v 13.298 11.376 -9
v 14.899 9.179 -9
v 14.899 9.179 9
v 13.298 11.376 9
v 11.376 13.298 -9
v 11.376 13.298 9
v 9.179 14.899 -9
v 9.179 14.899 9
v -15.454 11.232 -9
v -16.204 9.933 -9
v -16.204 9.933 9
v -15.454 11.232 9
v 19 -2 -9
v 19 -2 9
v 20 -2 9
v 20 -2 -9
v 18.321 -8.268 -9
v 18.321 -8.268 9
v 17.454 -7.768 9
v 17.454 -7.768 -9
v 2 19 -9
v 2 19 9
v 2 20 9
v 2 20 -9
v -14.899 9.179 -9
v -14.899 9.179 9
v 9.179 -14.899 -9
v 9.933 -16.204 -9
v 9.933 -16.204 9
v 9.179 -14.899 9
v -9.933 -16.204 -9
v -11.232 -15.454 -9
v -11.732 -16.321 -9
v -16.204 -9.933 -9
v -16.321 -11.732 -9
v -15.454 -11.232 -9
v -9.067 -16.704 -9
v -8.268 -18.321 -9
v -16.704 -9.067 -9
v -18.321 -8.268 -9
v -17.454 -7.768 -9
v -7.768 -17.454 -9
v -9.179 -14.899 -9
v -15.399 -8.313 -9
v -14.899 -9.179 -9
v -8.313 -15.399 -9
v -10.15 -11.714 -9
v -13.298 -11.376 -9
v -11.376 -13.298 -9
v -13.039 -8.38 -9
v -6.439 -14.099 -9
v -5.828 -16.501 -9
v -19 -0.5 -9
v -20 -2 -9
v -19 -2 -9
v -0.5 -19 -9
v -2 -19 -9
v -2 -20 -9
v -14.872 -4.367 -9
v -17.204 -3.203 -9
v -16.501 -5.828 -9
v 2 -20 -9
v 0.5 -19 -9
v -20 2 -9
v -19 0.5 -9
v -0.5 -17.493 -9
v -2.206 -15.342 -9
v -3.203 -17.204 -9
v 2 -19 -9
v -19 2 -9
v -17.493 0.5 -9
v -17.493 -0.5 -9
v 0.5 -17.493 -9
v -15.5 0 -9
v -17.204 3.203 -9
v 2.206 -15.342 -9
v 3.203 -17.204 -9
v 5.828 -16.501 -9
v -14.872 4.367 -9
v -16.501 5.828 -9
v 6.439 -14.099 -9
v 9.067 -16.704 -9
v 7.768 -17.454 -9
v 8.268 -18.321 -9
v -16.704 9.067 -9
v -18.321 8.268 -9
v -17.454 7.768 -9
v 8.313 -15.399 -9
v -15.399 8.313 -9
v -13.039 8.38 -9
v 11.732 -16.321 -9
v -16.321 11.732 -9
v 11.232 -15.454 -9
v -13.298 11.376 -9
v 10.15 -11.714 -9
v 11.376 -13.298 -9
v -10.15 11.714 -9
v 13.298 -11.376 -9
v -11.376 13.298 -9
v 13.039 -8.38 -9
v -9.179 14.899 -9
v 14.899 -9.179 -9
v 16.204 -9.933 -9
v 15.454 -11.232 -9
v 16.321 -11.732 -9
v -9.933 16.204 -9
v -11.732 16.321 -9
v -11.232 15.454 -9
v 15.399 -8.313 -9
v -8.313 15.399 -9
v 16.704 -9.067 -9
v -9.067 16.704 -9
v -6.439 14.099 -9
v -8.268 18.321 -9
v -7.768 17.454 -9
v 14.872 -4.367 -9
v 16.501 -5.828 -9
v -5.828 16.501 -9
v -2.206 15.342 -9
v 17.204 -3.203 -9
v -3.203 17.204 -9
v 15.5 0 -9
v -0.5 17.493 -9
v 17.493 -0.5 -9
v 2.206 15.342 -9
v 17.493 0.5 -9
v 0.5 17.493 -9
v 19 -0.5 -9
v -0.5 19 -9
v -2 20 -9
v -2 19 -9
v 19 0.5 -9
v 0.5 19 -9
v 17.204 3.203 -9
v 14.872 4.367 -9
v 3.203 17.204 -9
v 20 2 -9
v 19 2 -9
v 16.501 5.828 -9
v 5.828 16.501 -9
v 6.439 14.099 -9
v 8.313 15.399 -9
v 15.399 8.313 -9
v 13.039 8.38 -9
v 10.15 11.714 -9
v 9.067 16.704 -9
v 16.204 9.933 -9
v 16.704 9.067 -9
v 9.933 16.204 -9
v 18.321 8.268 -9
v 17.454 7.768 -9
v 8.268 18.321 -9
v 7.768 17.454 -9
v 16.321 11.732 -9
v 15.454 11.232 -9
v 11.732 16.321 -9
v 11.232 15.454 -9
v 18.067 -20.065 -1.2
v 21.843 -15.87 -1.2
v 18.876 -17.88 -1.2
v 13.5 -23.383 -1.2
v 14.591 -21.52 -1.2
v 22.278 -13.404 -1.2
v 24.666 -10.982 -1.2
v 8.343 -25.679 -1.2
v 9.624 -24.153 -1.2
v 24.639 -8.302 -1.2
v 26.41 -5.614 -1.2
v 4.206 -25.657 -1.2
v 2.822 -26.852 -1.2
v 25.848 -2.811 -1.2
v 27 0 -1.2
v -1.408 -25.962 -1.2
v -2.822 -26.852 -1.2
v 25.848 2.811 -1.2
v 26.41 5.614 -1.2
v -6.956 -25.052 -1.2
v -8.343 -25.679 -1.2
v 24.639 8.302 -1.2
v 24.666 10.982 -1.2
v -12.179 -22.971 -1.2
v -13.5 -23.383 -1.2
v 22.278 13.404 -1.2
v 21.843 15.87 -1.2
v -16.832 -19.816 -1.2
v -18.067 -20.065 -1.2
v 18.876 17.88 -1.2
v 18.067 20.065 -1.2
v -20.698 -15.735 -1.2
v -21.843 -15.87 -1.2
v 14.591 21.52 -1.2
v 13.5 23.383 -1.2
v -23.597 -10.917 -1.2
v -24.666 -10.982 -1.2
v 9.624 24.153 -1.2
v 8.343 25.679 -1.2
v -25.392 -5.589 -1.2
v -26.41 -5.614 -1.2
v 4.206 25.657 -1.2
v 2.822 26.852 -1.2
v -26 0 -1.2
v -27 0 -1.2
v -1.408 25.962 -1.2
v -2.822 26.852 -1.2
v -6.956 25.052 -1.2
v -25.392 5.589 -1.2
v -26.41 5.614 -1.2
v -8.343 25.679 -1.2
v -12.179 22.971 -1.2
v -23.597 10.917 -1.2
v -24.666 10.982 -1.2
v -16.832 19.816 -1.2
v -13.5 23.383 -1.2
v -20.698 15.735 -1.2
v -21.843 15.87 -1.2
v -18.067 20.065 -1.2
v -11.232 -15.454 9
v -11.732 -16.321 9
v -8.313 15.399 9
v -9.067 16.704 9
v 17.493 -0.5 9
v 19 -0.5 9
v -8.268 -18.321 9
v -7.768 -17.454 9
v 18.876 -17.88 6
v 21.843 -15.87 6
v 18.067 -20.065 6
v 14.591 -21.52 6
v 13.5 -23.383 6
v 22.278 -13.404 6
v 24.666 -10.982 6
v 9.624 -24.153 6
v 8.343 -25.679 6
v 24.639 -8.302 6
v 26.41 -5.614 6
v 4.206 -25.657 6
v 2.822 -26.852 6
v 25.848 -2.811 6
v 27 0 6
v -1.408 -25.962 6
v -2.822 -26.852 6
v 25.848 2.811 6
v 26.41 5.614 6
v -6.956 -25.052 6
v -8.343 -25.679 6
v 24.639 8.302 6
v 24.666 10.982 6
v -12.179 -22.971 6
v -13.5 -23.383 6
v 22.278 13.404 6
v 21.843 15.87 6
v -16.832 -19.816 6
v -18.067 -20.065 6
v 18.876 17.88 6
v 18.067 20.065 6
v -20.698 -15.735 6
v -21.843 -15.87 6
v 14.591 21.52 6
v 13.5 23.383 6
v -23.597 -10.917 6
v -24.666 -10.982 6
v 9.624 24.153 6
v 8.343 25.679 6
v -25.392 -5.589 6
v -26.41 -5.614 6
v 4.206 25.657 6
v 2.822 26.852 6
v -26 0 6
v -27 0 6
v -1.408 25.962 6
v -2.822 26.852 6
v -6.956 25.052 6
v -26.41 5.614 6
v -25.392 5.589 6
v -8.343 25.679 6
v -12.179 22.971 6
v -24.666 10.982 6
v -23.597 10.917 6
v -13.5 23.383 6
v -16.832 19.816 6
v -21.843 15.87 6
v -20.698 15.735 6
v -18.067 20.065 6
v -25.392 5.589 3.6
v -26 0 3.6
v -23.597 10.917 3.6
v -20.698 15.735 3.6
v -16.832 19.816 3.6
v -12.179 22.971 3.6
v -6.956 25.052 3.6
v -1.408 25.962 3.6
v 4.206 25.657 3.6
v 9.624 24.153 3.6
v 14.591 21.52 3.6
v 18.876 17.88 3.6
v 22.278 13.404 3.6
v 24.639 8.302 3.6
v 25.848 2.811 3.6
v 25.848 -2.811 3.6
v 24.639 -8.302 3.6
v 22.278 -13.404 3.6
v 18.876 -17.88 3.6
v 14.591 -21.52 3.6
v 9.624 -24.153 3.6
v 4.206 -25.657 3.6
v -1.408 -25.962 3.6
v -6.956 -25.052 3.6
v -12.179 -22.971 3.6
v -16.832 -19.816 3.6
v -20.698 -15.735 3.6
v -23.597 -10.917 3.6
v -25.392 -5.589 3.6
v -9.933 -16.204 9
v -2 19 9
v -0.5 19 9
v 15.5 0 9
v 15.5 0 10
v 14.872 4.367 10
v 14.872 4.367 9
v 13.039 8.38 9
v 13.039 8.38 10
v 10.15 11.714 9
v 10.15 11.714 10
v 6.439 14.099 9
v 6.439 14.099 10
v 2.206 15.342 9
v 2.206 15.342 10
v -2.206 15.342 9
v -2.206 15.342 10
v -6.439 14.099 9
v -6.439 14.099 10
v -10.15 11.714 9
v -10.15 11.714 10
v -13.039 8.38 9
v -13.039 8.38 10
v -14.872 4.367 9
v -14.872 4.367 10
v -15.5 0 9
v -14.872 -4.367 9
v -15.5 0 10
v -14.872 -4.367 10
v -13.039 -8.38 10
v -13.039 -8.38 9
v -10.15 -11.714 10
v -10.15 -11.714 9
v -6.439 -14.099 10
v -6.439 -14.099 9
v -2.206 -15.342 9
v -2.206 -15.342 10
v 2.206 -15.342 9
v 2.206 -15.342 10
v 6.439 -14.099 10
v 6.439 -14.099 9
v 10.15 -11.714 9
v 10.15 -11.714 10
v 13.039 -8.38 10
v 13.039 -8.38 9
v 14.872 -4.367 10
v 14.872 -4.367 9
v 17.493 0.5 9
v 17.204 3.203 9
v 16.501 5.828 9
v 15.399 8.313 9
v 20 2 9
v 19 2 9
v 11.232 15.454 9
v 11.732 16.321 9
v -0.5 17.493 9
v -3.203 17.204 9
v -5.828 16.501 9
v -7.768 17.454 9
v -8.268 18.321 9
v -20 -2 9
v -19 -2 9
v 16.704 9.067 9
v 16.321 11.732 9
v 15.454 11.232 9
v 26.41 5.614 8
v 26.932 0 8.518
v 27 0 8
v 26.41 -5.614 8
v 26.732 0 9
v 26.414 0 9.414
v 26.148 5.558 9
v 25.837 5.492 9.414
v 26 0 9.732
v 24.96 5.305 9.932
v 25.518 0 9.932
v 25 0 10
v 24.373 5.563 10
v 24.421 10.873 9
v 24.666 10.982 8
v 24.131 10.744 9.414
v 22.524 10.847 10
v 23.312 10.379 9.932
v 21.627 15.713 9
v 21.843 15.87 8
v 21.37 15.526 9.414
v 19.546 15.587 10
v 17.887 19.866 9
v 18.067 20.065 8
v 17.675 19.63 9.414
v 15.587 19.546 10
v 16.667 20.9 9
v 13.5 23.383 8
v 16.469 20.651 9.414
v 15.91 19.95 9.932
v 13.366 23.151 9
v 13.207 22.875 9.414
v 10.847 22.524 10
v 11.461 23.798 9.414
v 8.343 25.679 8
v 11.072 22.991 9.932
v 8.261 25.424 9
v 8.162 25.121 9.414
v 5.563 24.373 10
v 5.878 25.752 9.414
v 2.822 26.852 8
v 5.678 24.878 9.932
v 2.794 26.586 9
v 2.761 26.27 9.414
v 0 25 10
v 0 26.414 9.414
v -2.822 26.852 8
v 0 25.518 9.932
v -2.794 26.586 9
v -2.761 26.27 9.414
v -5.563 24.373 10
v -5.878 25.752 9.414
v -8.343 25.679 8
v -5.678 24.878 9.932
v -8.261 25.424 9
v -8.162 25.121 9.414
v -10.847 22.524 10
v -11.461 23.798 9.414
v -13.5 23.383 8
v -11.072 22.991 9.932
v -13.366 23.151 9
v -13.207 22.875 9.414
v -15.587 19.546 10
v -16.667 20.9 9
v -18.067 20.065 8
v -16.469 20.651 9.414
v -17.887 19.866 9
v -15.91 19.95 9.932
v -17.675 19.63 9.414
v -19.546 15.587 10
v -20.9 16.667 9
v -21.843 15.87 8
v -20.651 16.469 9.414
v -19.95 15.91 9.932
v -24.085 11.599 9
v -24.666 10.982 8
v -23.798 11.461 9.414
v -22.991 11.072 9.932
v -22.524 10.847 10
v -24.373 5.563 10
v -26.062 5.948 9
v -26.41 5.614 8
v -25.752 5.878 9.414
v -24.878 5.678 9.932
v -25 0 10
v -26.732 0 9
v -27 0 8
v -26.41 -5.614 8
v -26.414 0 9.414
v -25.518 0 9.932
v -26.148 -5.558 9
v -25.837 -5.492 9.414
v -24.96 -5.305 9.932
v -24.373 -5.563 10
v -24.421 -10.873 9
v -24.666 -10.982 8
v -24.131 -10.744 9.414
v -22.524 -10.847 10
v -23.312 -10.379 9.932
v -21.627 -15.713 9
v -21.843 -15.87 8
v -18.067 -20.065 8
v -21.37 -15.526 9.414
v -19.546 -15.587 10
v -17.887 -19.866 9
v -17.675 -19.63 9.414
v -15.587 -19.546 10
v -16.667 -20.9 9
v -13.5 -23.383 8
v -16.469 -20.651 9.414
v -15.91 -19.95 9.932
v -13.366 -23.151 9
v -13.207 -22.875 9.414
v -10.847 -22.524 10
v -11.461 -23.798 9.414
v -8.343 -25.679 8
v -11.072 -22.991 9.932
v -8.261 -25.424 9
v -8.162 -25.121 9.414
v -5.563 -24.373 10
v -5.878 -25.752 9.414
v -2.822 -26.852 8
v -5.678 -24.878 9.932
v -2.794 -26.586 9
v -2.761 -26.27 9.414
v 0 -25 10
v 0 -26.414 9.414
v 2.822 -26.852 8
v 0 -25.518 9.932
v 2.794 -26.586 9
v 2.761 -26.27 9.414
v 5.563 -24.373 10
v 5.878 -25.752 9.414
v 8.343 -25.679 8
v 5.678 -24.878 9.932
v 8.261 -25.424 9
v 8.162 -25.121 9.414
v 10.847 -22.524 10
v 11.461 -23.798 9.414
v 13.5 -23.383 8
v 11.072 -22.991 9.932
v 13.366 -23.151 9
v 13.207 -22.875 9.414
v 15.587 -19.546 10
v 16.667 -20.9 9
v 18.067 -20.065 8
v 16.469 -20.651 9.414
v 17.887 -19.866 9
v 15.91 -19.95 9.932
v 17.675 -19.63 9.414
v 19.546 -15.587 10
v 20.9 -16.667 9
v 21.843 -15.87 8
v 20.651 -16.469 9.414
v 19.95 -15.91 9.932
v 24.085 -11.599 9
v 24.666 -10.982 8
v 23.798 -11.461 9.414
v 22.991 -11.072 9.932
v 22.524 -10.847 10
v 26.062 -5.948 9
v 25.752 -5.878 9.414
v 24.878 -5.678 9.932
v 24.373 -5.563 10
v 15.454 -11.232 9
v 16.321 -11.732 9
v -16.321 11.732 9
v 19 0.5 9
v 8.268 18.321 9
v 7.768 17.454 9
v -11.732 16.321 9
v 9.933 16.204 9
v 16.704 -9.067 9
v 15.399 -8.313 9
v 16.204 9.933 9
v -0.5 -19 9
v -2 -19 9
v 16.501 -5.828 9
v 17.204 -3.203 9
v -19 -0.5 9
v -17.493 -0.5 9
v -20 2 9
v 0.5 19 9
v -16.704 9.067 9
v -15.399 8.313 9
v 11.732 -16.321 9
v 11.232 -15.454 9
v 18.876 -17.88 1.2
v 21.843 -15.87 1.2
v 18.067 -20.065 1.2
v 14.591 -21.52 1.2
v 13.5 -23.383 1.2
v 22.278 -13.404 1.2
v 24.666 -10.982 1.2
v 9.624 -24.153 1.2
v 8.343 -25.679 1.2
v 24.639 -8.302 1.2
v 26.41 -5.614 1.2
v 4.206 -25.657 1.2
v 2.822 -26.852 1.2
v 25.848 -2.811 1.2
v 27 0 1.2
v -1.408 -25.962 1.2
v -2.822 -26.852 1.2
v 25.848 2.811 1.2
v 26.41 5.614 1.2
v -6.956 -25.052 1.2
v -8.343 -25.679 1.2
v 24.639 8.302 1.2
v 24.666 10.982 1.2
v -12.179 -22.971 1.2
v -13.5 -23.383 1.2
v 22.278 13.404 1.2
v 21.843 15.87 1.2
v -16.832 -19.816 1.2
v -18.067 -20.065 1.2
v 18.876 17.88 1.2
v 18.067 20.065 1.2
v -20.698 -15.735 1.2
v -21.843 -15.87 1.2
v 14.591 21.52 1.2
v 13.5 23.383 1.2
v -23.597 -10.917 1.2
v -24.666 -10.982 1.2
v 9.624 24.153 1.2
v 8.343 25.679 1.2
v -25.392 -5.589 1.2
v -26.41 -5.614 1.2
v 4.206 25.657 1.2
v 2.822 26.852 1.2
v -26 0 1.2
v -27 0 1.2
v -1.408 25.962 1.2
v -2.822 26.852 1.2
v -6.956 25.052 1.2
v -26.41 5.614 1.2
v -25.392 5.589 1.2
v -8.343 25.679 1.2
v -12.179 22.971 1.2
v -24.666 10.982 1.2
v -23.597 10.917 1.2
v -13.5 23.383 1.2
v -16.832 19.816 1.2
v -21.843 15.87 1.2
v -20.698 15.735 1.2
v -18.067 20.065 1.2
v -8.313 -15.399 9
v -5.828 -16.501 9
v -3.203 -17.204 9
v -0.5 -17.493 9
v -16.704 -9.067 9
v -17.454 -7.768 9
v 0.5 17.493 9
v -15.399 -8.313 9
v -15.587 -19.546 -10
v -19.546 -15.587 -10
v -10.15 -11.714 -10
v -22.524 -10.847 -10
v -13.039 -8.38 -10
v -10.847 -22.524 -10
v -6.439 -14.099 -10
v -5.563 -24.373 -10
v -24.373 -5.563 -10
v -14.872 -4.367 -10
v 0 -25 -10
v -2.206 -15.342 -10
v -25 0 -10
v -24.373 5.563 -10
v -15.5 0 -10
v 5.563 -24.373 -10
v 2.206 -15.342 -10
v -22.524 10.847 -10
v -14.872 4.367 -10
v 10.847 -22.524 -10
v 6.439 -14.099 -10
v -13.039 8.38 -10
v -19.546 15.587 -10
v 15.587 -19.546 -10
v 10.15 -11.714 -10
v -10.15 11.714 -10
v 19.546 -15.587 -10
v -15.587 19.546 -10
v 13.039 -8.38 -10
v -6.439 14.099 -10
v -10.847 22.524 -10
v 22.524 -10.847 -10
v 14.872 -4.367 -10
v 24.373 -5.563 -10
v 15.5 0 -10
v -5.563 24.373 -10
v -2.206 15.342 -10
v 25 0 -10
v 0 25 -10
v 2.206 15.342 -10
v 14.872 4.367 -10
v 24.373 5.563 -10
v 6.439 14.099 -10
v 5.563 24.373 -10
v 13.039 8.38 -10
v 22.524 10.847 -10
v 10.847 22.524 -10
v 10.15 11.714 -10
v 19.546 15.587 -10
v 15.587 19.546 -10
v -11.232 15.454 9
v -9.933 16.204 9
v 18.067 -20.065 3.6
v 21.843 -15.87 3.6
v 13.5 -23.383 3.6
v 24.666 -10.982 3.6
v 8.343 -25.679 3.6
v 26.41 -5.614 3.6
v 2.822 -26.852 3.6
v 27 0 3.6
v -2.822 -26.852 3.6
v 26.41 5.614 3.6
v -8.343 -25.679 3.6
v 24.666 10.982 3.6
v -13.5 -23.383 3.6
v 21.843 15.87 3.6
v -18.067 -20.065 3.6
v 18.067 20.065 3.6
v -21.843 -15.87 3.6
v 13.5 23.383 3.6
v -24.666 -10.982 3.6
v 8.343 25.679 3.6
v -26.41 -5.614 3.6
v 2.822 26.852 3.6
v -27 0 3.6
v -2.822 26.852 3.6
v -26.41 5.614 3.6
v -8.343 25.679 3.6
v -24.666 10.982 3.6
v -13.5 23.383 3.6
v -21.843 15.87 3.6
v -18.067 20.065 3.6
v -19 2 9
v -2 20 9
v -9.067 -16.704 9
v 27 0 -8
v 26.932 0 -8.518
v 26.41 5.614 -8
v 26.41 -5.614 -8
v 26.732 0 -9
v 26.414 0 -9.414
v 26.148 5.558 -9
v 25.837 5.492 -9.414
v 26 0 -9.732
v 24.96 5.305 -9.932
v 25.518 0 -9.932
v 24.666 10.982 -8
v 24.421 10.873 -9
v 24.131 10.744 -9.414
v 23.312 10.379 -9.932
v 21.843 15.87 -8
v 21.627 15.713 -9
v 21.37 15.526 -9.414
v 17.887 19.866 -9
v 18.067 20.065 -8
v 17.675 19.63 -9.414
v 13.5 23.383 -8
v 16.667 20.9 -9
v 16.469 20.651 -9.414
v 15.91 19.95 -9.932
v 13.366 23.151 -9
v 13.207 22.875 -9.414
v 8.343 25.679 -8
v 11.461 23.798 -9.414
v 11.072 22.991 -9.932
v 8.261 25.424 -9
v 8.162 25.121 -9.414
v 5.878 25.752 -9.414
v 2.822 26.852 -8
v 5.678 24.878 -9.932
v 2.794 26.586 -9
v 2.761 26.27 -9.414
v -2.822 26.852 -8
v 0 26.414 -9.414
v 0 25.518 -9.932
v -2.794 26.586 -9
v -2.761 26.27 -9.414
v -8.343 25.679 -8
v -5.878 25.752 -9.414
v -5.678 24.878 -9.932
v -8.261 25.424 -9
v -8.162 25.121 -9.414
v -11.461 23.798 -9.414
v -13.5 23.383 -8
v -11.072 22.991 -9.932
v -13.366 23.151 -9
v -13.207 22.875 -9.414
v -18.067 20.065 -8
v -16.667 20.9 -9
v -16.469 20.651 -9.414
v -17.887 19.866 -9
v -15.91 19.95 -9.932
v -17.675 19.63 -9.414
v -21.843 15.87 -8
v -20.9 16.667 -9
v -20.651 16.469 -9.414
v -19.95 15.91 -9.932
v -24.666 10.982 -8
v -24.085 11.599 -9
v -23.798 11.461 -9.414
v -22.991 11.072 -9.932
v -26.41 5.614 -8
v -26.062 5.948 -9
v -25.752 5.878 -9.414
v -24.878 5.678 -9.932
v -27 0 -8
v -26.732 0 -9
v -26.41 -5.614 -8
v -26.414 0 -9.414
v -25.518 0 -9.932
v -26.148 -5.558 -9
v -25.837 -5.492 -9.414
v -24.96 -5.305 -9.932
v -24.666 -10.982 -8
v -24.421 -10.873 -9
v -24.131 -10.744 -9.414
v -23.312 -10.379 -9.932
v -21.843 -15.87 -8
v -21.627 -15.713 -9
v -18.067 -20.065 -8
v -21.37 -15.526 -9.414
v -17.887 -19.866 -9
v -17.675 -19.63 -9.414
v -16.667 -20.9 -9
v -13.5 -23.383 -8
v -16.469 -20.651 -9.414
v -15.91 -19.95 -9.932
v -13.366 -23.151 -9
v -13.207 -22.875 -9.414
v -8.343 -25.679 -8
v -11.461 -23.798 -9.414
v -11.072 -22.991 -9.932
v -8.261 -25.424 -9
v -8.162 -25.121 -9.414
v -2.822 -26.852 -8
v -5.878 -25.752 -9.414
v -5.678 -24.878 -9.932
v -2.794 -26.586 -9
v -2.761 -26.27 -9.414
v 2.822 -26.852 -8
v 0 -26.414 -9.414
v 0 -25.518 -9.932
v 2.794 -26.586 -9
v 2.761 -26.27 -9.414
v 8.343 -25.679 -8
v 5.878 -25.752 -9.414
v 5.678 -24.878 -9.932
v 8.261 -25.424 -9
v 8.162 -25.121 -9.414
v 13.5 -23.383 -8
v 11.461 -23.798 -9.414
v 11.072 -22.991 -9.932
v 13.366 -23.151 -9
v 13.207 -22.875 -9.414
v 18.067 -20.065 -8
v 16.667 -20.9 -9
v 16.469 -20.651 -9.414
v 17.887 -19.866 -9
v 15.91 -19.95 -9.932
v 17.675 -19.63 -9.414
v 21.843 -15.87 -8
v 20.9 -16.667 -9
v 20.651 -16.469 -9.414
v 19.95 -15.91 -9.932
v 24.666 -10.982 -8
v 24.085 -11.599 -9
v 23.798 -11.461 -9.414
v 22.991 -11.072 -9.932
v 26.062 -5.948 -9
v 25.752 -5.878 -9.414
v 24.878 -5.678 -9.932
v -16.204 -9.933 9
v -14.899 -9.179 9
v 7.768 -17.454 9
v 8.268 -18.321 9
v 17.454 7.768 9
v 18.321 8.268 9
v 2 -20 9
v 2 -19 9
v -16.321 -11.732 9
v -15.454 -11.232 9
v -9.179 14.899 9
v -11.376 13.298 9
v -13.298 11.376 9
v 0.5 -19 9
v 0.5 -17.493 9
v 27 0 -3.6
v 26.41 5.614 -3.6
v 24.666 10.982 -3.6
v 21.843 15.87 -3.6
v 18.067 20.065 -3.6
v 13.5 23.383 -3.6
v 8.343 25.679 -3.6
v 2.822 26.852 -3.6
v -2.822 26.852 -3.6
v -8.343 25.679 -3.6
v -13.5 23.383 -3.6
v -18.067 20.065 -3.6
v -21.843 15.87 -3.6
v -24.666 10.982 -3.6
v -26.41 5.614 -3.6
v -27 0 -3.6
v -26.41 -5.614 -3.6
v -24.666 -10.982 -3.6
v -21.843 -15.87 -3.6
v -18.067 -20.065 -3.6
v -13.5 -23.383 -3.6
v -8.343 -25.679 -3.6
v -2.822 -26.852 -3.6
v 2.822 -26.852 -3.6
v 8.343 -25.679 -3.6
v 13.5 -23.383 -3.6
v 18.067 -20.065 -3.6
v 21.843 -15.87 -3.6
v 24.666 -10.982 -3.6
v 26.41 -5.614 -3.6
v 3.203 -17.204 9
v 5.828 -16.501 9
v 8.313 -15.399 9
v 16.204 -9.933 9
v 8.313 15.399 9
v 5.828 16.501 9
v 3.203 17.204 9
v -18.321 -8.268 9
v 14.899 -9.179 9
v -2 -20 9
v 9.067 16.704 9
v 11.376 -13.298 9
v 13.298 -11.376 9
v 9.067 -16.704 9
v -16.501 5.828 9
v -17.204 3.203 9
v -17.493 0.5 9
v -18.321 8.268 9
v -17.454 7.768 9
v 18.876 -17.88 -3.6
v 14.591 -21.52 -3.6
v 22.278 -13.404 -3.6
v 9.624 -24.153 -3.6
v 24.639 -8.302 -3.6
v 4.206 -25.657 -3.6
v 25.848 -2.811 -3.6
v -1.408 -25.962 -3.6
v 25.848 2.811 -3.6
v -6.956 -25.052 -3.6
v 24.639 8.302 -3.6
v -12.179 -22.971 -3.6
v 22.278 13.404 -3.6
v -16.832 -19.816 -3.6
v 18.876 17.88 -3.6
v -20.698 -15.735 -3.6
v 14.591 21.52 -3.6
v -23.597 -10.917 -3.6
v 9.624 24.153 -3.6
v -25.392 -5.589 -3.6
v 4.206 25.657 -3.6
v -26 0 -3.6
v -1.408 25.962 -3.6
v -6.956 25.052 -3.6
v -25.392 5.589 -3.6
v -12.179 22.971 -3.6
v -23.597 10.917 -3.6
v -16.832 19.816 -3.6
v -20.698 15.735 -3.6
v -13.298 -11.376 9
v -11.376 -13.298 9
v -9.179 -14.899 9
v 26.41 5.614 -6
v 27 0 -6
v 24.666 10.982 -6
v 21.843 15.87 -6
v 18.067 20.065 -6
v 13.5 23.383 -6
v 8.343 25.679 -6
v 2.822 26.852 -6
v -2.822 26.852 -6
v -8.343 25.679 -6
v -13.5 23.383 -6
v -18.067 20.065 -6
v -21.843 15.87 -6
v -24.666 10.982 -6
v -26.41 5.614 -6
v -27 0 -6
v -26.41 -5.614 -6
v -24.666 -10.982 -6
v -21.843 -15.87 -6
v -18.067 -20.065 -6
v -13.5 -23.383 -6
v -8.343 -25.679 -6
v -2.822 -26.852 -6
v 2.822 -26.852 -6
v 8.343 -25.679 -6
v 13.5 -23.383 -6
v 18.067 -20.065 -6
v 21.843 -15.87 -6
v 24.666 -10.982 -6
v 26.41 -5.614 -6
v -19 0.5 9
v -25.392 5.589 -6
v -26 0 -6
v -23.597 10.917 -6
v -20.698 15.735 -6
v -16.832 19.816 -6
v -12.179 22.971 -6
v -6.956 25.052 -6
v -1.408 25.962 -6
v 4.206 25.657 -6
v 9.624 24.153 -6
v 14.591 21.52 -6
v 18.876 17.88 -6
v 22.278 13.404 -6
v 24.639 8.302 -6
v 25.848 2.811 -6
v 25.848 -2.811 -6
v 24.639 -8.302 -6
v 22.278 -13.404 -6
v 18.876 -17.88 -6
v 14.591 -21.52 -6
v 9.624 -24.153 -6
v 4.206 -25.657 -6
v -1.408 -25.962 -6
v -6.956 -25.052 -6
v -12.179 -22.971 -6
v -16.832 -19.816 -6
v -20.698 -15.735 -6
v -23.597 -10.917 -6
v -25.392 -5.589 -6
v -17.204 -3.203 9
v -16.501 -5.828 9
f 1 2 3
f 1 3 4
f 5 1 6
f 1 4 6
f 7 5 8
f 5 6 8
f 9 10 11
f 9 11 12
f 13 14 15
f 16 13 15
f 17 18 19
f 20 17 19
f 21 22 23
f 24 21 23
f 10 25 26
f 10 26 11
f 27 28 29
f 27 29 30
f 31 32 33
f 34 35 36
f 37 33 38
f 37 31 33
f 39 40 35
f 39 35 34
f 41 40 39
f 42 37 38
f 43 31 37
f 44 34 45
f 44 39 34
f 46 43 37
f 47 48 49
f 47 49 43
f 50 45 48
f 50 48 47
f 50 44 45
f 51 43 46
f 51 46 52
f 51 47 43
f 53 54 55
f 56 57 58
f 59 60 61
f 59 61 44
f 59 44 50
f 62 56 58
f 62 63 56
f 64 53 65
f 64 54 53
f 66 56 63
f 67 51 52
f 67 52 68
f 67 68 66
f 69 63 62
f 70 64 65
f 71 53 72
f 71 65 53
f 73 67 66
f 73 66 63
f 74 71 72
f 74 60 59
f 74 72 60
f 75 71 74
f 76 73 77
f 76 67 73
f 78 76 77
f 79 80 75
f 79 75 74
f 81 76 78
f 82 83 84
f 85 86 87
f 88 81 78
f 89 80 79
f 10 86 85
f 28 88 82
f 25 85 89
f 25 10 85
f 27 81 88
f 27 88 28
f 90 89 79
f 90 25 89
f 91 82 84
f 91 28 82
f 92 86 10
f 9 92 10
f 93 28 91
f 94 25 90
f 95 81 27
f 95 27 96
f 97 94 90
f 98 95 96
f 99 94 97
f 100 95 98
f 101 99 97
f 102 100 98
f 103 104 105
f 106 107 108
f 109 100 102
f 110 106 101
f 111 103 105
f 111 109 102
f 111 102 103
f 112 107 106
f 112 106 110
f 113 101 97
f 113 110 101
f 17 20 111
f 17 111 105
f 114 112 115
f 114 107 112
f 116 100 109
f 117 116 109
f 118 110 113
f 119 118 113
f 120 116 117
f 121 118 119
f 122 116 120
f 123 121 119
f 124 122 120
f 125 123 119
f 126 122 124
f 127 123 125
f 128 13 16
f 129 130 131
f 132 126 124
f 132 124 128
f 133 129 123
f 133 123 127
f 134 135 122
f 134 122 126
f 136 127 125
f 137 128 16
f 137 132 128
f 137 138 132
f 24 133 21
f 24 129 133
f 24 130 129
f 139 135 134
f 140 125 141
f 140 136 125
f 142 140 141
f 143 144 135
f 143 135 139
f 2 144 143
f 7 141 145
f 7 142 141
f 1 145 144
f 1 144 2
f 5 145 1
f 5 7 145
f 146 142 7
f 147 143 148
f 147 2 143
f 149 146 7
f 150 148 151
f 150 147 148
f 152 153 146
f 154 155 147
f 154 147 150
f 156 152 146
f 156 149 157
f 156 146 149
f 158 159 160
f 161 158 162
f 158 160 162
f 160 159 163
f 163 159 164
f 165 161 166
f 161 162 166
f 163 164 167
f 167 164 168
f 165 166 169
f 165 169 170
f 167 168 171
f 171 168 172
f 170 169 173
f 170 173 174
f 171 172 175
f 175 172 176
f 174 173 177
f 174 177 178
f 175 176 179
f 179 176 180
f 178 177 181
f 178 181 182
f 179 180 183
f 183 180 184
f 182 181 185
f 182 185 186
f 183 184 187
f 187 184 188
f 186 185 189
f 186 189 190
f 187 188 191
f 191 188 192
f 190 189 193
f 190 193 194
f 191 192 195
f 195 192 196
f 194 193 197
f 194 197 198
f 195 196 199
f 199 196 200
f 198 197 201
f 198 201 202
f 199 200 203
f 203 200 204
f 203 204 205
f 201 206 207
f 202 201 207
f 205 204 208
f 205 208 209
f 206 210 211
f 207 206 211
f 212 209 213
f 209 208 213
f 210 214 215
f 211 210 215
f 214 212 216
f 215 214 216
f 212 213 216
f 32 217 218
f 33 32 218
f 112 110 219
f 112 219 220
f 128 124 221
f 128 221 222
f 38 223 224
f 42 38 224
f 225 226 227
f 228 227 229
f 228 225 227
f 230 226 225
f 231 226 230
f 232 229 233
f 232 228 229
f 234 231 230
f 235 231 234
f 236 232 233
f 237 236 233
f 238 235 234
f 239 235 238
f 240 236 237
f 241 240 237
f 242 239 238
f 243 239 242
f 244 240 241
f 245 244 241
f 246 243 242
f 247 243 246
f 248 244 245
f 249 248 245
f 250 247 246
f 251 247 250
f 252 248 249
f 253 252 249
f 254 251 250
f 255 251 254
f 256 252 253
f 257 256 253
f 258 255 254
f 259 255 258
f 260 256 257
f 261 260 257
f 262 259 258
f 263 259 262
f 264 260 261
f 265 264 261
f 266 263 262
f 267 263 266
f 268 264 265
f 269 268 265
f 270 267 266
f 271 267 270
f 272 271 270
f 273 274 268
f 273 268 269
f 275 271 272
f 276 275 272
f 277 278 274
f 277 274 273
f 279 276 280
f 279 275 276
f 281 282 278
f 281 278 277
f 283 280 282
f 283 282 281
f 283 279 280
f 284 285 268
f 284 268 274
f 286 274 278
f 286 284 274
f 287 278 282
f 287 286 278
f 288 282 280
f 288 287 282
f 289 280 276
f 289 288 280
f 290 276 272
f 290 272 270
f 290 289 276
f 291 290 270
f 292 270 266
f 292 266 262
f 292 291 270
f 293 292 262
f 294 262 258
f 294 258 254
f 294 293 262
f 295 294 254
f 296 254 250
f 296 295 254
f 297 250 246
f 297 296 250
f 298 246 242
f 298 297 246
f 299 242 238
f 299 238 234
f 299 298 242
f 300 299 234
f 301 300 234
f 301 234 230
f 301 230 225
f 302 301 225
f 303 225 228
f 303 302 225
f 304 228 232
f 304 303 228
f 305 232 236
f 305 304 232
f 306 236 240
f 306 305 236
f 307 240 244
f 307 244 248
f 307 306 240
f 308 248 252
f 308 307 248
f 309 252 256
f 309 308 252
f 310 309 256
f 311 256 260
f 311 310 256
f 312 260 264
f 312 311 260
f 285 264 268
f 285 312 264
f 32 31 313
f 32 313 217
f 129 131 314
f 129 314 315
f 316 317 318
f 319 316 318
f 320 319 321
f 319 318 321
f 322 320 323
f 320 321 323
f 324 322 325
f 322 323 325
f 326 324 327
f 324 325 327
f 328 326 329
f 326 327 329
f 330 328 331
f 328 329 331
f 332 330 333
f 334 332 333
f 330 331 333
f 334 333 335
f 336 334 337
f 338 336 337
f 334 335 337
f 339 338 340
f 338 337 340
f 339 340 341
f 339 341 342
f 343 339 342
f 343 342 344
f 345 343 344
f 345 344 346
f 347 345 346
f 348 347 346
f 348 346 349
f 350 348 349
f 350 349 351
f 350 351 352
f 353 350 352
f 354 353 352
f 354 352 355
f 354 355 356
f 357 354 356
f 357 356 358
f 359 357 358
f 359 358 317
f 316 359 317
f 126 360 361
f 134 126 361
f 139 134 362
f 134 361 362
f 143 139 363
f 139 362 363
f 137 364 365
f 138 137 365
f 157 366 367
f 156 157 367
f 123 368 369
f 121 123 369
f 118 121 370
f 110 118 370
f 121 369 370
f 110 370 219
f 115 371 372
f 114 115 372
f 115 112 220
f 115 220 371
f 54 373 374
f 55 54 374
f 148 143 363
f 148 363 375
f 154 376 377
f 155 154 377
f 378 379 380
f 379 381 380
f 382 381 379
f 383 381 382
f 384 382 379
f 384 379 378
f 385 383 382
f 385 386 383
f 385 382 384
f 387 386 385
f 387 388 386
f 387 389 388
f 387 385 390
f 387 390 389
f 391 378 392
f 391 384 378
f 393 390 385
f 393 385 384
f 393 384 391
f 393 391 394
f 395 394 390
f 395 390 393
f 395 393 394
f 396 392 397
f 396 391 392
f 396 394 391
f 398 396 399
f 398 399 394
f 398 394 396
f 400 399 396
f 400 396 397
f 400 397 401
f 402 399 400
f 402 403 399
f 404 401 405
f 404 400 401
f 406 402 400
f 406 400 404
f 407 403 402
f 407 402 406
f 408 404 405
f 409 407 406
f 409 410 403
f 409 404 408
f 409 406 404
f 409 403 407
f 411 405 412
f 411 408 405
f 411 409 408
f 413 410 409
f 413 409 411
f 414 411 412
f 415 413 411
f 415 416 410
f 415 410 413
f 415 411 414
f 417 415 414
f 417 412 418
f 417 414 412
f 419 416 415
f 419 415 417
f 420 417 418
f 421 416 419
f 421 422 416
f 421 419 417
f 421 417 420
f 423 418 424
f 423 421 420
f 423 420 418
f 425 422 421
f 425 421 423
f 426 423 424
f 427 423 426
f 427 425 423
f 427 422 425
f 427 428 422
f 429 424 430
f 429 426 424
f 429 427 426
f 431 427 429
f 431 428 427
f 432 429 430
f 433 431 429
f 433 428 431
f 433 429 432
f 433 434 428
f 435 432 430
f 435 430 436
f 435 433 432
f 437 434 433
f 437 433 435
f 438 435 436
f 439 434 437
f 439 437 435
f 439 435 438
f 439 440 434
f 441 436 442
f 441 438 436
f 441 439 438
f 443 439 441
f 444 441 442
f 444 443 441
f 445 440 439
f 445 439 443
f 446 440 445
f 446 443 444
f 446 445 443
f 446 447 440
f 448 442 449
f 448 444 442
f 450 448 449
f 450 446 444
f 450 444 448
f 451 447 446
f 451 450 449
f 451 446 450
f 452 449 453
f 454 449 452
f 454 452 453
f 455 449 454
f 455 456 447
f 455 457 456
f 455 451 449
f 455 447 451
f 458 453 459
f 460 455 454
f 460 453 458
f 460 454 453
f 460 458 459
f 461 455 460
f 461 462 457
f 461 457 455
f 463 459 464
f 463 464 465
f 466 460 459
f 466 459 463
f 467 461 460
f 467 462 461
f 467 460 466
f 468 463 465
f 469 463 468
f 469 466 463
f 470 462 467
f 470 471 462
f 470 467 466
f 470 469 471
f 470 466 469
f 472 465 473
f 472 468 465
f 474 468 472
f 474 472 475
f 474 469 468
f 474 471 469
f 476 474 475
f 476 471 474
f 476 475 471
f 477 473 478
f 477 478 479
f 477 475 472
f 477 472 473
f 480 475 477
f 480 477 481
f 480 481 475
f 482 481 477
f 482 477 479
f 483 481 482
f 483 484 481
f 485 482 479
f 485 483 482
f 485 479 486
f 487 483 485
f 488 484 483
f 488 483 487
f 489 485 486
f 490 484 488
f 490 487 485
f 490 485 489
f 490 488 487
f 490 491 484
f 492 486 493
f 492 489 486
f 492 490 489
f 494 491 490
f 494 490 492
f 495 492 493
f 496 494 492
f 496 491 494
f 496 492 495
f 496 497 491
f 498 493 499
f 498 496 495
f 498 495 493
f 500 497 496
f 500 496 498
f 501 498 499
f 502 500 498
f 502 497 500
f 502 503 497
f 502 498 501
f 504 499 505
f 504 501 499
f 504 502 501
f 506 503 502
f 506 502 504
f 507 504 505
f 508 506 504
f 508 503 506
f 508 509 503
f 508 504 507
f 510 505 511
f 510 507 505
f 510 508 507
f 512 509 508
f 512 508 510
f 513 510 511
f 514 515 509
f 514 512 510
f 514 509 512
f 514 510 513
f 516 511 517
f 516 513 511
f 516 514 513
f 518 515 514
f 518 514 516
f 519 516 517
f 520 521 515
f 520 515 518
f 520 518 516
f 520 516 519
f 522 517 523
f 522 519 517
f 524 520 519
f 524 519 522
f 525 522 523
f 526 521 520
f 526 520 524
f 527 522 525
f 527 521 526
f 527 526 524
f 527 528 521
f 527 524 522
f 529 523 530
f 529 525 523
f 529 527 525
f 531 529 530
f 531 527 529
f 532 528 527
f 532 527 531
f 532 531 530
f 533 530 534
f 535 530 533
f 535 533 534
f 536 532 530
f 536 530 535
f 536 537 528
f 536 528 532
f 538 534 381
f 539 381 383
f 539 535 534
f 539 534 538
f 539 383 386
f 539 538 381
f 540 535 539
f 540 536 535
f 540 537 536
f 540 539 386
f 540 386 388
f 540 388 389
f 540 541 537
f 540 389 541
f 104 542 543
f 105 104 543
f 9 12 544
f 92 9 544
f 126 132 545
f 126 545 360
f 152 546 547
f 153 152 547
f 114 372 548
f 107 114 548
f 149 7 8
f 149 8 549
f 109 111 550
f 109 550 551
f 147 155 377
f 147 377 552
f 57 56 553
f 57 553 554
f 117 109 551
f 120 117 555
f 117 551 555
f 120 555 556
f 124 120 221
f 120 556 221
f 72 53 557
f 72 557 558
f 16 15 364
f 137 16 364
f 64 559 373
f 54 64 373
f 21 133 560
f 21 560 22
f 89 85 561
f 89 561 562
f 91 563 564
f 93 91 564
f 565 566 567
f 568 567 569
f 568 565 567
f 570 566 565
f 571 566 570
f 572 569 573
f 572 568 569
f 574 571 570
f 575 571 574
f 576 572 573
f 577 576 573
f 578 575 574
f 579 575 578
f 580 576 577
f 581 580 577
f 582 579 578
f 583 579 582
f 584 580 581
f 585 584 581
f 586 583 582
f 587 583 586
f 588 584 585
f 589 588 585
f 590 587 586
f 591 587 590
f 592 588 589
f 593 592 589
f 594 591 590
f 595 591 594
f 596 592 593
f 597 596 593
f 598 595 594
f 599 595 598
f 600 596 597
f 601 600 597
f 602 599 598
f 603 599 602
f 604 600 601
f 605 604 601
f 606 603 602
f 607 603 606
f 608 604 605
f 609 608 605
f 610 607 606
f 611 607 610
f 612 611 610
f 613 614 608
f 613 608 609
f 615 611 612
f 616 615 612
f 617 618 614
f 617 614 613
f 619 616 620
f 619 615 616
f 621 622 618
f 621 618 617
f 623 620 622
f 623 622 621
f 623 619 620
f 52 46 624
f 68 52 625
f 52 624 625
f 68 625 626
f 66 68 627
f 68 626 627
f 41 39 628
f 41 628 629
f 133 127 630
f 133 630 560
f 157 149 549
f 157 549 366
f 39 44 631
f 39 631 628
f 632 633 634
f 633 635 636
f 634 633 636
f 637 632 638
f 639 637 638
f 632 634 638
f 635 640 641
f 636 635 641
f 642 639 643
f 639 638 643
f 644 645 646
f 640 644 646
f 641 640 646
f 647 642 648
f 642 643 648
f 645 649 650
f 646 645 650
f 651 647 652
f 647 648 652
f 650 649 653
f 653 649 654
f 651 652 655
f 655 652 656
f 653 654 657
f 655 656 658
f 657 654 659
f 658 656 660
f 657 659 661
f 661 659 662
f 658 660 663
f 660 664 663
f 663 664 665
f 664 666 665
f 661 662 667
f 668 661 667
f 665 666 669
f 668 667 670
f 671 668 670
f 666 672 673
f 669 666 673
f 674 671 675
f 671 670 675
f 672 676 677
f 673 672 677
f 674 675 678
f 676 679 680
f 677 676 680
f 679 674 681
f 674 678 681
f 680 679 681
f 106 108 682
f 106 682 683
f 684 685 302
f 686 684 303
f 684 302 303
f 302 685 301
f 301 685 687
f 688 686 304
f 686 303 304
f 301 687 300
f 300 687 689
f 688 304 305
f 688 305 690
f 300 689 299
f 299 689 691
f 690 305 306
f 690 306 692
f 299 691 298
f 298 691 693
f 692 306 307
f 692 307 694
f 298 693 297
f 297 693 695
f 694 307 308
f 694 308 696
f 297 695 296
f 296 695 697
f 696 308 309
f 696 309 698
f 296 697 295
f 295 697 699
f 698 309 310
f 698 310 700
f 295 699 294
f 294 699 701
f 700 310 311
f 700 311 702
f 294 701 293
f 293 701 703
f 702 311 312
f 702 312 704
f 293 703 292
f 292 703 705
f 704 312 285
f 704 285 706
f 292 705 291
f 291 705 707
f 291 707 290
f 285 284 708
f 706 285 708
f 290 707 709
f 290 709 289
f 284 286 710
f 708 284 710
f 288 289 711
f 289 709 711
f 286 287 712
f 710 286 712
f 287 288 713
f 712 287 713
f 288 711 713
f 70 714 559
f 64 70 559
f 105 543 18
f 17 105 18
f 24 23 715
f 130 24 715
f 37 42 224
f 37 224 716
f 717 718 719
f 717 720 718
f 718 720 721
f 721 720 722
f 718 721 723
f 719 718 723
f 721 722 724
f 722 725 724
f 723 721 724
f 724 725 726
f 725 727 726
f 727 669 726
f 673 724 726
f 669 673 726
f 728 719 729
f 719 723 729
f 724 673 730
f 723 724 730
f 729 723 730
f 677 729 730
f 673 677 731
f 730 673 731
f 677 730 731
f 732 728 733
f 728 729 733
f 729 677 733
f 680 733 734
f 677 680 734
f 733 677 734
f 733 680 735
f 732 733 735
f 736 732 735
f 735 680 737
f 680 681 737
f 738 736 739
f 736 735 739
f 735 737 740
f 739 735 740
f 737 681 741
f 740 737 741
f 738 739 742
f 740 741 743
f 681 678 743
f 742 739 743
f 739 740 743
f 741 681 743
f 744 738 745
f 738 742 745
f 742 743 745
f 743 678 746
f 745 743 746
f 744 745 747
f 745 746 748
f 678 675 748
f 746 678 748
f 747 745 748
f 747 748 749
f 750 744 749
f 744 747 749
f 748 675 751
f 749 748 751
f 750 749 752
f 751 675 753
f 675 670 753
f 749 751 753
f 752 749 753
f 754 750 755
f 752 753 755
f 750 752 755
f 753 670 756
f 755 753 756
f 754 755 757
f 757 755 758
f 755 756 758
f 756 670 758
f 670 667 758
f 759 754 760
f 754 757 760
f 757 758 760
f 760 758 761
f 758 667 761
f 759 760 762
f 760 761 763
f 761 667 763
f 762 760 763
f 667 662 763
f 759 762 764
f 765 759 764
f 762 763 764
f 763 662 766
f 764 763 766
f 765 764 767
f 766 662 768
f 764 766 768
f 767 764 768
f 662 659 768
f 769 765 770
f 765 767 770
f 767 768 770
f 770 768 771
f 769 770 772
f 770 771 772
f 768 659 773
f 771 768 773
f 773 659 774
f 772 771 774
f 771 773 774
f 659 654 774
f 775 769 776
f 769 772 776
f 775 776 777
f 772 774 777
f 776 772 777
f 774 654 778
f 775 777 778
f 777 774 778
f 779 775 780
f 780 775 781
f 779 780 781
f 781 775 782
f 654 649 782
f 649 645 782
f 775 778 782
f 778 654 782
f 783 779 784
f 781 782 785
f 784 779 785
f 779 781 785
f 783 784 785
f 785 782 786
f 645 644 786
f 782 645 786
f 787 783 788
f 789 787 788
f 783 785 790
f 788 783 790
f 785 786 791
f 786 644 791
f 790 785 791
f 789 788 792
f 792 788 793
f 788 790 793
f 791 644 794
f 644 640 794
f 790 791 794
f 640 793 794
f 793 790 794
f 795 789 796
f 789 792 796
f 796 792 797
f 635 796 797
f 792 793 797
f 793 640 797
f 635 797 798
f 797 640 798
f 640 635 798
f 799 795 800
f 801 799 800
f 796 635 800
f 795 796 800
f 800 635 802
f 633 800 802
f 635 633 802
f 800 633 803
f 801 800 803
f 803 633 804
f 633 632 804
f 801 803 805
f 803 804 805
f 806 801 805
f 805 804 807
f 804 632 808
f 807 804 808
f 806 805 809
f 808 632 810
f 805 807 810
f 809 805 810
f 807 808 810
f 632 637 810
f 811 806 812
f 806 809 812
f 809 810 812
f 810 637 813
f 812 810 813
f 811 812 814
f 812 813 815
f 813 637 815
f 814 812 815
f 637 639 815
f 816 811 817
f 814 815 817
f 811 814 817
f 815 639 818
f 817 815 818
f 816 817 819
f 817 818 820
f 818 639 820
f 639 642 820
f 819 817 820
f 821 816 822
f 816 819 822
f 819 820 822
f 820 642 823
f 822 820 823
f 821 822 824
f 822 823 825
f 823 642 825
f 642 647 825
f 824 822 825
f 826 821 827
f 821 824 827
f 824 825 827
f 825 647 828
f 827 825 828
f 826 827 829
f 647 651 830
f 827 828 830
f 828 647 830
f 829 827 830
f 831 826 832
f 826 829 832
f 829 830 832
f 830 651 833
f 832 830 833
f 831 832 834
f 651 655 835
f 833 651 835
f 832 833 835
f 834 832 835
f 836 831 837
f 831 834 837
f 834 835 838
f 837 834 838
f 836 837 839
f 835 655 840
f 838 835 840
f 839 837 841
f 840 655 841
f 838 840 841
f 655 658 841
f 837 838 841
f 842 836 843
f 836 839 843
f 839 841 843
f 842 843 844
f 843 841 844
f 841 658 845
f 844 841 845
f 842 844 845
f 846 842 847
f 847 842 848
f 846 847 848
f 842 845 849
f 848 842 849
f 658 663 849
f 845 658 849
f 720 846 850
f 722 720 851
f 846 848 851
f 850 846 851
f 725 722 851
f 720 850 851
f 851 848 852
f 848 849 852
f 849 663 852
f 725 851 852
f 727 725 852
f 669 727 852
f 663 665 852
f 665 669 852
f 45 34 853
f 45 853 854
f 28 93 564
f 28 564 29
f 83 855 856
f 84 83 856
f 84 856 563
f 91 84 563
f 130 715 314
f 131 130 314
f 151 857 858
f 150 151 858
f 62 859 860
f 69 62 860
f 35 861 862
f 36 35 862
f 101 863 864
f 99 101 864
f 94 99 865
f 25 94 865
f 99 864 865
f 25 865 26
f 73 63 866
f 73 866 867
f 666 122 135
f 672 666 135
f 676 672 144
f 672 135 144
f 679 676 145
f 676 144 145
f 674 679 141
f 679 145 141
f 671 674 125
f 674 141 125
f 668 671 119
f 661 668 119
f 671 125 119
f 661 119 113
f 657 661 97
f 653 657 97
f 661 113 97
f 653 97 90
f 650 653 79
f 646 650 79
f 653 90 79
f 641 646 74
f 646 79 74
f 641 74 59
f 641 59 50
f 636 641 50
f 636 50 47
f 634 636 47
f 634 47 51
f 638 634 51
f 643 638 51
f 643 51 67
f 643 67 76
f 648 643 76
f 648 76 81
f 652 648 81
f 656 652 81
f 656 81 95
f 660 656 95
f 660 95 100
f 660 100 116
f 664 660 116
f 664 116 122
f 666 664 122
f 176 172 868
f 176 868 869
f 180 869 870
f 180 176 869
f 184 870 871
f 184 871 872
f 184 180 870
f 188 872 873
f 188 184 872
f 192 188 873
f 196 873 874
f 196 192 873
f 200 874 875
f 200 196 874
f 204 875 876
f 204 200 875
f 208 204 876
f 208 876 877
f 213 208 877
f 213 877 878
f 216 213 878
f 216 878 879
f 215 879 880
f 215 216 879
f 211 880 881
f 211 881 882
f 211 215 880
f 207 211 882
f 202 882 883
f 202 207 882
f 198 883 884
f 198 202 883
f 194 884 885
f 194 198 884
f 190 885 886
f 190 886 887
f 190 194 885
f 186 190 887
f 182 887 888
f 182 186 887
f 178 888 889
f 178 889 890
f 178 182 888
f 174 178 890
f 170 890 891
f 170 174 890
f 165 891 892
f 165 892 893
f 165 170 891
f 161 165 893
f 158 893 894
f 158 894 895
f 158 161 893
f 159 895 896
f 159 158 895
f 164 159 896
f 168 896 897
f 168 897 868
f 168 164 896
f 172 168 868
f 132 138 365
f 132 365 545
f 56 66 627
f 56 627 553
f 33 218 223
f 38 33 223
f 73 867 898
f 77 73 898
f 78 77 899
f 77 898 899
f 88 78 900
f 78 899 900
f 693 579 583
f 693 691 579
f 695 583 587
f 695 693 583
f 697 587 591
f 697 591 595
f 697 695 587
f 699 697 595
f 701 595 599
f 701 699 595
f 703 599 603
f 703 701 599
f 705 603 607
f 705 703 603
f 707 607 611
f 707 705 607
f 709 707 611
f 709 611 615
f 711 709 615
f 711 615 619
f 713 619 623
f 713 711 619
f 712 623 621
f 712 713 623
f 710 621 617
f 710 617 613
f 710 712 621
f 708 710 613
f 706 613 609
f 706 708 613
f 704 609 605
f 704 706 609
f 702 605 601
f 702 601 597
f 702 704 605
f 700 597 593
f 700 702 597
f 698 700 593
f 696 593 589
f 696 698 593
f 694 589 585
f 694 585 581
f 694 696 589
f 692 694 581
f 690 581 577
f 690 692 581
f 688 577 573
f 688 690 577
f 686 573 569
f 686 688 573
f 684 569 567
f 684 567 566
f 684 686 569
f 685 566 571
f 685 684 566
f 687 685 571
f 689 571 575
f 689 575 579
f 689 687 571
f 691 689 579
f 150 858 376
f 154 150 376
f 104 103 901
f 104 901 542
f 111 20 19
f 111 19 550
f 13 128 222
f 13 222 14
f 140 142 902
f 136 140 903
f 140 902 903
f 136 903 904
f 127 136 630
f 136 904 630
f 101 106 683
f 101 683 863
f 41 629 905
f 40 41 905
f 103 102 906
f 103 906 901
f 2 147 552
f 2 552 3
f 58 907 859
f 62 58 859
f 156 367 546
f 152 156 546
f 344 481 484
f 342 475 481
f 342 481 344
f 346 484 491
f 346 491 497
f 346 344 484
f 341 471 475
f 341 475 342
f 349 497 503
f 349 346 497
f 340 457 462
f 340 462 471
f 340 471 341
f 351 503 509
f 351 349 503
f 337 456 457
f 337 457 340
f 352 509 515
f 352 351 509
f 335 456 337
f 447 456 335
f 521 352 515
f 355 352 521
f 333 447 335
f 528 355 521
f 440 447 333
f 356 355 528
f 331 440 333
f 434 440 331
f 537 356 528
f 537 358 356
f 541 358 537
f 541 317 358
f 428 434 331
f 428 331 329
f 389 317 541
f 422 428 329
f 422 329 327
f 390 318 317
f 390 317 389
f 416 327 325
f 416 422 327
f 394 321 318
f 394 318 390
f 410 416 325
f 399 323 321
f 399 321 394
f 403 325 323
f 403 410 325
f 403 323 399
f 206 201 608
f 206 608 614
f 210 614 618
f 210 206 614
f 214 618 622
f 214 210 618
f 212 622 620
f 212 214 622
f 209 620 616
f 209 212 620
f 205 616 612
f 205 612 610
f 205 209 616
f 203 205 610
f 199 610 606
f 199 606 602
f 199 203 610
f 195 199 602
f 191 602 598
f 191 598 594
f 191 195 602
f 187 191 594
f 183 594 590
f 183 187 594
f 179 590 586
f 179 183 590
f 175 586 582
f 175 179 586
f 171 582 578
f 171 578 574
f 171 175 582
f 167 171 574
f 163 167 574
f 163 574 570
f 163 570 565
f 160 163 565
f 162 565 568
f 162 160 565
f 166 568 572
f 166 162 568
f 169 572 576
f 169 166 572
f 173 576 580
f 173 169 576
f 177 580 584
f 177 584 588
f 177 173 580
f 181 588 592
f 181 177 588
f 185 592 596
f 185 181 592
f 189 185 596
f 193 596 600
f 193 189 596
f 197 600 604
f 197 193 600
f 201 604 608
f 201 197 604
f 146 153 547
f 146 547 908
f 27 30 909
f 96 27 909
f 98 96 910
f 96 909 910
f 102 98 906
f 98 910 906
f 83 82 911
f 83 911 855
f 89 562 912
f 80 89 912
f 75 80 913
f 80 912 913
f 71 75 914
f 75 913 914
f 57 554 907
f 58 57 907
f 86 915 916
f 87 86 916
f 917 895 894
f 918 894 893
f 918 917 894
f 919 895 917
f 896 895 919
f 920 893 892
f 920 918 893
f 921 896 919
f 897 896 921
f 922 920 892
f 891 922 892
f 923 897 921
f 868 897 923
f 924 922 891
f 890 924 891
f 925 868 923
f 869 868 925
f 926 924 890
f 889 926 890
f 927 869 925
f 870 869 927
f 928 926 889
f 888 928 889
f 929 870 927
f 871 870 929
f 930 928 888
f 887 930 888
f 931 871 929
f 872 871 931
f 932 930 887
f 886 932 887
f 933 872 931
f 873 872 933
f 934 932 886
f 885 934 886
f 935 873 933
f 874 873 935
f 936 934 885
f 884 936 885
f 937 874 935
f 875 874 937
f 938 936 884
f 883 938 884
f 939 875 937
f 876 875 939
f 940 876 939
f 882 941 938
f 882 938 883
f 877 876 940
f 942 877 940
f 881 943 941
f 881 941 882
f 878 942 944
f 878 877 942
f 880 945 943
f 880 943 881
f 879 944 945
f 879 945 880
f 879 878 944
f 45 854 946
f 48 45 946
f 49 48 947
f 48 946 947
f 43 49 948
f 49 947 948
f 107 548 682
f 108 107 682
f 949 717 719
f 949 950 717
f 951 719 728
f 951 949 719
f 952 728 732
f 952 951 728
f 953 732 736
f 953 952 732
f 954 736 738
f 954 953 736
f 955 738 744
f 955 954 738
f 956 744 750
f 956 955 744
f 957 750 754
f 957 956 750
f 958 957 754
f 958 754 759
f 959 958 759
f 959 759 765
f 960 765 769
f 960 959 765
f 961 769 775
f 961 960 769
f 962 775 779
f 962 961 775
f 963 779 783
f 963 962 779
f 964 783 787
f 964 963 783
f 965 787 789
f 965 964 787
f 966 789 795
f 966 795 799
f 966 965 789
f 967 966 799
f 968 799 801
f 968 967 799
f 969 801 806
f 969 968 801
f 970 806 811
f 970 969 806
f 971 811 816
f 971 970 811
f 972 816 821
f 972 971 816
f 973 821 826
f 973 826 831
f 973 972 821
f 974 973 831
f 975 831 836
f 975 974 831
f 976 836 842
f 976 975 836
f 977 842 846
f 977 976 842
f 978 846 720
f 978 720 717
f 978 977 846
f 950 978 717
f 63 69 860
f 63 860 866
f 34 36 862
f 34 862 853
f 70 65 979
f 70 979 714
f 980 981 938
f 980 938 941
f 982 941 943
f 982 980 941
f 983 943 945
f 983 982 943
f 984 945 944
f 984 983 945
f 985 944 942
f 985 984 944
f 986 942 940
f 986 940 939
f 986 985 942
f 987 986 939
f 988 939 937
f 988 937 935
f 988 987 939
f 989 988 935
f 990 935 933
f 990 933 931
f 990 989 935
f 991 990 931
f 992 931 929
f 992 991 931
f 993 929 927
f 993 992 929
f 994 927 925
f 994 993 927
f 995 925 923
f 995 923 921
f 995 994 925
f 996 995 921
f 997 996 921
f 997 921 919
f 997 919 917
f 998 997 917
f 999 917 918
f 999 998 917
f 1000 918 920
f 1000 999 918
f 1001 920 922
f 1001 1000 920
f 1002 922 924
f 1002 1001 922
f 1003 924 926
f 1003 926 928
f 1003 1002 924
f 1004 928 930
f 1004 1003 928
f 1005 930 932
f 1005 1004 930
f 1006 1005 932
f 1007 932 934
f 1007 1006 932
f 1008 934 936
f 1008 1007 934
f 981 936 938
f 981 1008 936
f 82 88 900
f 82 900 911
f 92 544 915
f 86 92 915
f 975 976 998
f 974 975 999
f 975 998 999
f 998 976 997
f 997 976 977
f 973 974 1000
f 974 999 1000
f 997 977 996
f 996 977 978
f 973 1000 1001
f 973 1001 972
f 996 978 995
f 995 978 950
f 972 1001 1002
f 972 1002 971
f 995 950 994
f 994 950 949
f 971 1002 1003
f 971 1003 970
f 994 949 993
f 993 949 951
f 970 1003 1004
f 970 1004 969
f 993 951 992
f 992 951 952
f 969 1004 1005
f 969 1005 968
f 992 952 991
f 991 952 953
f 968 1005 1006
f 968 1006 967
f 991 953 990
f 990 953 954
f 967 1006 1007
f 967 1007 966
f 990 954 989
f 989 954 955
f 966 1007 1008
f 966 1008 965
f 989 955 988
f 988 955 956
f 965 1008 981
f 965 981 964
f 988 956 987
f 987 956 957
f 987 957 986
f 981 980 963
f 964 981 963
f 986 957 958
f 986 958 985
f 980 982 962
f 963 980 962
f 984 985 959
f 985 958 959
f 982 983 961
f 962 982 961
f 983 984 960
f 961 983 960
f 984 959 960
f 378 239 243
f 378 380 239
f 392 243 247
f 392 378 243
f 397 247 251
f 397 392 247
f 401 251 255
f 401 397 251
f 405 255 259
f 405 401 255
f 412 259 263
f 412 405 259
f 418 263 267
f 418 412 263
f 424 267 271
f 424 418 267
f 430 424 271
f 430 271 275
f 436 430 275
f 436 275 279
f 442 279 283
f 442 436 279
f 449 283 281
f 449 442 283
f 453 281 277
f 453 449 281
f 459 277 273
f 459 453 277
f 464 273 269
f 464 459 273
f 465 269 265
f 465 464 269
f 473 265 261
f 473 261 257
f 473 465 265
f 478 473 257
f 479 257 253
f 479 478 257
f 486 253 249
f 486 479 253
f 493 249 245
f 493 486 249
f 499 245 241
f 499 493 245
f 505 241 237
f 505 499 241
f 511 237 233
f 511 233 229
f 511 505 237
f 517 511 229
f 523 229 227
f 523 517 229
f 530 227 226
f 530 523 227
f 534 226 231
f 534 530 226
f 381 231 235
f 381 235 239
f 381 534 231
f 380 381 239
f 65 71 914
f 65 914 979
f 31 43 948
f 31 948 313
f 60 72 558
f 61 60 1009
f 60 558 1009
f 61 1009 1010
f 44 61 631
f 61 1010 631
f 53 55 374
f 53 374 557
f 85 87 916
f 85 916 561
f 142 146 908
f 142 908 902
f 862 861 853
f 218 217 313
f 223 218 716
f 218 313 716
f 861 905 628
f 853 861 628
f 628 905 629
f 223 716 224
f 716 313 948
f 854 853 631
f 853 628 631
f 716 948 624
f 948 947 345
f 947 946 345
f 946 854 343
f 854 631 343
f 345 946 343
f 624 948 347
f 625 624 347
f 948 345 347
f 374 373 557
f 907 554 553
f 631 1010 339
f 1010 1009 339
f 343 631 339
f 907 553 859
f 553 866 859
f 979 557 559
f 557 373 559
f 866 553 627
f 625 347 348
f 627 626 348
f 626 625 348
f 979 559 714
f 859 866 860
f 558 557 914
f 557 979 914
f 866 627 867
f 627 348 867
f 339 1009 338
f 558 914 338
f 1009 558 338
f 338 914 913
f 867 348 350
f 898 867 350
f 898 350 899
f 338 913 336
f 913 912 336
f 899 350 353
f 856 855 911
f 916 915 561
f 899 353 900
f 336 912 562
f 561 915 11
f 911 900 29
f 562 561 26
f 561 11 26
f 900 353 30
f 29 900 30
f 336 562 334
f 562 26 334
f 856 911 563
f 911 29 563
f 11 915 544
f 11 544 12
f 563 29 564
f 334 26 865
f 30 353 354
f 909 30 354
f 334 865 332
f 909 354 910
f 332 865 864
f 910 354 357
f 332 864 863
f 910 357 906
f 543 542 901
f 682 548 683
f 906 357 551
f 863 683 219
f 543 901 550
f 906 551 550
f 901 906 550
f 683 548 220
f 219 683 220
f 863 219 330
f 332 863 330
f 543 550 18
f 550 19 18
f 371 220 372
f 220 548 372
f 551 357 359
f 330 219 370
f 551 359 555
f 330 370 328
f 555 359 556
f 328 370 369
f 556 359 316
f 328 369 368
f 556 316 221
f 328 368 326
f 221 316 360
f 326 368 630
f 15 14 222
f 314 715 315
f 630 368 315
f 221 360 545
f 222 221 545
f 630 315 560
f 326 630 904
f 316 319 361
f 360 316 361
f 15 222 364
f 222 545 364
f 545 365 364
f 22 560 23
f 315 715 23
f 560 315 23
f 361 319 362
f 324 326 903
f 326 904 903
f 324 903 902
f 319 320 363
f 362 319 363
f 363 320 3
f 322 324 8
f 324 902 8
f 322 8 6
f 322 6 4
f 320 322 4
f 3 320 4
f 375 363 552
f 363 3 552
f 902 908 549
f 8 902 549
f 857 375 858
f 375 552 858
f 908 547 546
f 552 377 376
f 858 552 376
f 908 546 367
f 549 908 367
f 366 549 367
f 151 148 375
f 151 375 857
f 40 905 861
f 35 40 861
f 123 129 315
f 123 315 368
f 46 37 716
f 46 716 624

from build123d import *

# Parameters (mm, degrees)
SKETCH_1_R               = 27
EXTRUDE_1_DEPTH          = 10
FILLET_1_R               = 2
SKETCH_3_R               = 17.5
CUT_EXTRUDE_1_DEPTH      = 9
SKETCH_5_R               = 15.5
CUT_EXTRUDE_2_DEPTH      = 44.10452425
CUT_EXTRUDE_3_DEPTH      = 9
PATTERN_CIRCULAR_1_COUNT = 12
CUT_EXTRUDE_START        = -4
SKETCH_7_R               = 30.427908266
SKETCH_7_R_2             = 26
CUT_EXTRUDE_4_DEPTH      = 2.4
PATTERN_LINEAR_1_COUNT   = 3
PATTERN_LINEAR_1_PITCH   = 4.8


with BuildPart() as part:
    # 草图1 → 凸台-拉伸1 (new, symmetric)
    with BuildSketch(Plane.XY):
        Circle(SKETCH_1_R)
    extrude(amount=EXTRUDE_1_DEPTH, both=True)

    # 圆角1
    fillet_1_edges = [part.edges().sort_by_distance(p)[0] for p in [
        (-27, 0, -10),
        (-27, 0, 10),
    ]]
    fillet(fillet_1_edges, radius=FILLET_1_R)

    # 草图3 → 切除-拉伸1 (cut, symmetric)
    with BuildSketch(Plane.XY):
        Circle(SKETCH_3_R)
    extrude(amount=CUT_EXTRUDE_1_DEPTH, both=True, mode=Mode.SUBTRACT)

    # 草图5 → 切除-拉伸2 (cut, through all)
    with BuildSketch(Plane.XY.offset(10)):
        Circle(SKETCH_5_R)
    extrude(amount=-CUT_EXTRUDE_2_DEPTH, mode=Mode.SUBTRACT)

    # 草图6 → 切除-拉伸3 (cut, symmetric)
    with BuildSketch(Plane.XY):
        with BuildLine():
            Line((0.5, 17.492855685), (0.5, 19))
            Line((0.5, 19), (2, 19))
            Line((2, 19), (2, 20))
            Line((2, 20), (-2, 20))
            Line((-2, 20), (-2, 19))
            Line((-2, 19), (-0.5, 19))
            Line((-0.5, 19), (-0.5, 17.492855685))
            ThreePointArc((-0.5, 17.492855685), (0, 17.5), (0.5, 17.492855685))
        make_face()
    cut_extrude_3 = extrude(amount=CUT_EXTRUDE_3_DEPTH, both=True, mode=Mode.SUBTRACT)

    # 阵列(圆周)1: 切除-拉伸3 ×12 about axis
    pattern_circular_1_axis = Axis((0, 0, 0), (0, 0, 1))
    for i in range(1, PATTERN_CIRCULAR_1_COUNT):
        add(cut_extrude_3.rotate(pattern_circular_1_axis, i * 360 / PATTERN_CIRCULAR_1_COUNT), mode=Mode.SUBTRACT)

    # 草图7 → 切除-拉伸4 (cut)
    with BuildSketch(Plane(origin=(0, 0, -10), x_dir=(-1, 0, 0), z_dir=(0, 0, -1)).offset(CUT_EXTRUDE_START)):
        Circle(SKETCH_7_R)
        Circle(SKETCH_7_R_2, mode=Mode.SUBTRACT)
    cut_extrude_4 = extrude(amount=-CUT_EXTRUDE_4_DEPTH, mode=Mode.SUBTRACT)

    # 阵列(线性)1: 切除-拉伸4 ×3
    with Locations(*[(0, 0, i * PATTERN_LINEAR_1_PITCH) for i in range(1, PATTERN_LINEAR_1_COUNT)]):
        add(cut_extrude_4, mode=Mode.SUBTRACT)


solid = part.part
